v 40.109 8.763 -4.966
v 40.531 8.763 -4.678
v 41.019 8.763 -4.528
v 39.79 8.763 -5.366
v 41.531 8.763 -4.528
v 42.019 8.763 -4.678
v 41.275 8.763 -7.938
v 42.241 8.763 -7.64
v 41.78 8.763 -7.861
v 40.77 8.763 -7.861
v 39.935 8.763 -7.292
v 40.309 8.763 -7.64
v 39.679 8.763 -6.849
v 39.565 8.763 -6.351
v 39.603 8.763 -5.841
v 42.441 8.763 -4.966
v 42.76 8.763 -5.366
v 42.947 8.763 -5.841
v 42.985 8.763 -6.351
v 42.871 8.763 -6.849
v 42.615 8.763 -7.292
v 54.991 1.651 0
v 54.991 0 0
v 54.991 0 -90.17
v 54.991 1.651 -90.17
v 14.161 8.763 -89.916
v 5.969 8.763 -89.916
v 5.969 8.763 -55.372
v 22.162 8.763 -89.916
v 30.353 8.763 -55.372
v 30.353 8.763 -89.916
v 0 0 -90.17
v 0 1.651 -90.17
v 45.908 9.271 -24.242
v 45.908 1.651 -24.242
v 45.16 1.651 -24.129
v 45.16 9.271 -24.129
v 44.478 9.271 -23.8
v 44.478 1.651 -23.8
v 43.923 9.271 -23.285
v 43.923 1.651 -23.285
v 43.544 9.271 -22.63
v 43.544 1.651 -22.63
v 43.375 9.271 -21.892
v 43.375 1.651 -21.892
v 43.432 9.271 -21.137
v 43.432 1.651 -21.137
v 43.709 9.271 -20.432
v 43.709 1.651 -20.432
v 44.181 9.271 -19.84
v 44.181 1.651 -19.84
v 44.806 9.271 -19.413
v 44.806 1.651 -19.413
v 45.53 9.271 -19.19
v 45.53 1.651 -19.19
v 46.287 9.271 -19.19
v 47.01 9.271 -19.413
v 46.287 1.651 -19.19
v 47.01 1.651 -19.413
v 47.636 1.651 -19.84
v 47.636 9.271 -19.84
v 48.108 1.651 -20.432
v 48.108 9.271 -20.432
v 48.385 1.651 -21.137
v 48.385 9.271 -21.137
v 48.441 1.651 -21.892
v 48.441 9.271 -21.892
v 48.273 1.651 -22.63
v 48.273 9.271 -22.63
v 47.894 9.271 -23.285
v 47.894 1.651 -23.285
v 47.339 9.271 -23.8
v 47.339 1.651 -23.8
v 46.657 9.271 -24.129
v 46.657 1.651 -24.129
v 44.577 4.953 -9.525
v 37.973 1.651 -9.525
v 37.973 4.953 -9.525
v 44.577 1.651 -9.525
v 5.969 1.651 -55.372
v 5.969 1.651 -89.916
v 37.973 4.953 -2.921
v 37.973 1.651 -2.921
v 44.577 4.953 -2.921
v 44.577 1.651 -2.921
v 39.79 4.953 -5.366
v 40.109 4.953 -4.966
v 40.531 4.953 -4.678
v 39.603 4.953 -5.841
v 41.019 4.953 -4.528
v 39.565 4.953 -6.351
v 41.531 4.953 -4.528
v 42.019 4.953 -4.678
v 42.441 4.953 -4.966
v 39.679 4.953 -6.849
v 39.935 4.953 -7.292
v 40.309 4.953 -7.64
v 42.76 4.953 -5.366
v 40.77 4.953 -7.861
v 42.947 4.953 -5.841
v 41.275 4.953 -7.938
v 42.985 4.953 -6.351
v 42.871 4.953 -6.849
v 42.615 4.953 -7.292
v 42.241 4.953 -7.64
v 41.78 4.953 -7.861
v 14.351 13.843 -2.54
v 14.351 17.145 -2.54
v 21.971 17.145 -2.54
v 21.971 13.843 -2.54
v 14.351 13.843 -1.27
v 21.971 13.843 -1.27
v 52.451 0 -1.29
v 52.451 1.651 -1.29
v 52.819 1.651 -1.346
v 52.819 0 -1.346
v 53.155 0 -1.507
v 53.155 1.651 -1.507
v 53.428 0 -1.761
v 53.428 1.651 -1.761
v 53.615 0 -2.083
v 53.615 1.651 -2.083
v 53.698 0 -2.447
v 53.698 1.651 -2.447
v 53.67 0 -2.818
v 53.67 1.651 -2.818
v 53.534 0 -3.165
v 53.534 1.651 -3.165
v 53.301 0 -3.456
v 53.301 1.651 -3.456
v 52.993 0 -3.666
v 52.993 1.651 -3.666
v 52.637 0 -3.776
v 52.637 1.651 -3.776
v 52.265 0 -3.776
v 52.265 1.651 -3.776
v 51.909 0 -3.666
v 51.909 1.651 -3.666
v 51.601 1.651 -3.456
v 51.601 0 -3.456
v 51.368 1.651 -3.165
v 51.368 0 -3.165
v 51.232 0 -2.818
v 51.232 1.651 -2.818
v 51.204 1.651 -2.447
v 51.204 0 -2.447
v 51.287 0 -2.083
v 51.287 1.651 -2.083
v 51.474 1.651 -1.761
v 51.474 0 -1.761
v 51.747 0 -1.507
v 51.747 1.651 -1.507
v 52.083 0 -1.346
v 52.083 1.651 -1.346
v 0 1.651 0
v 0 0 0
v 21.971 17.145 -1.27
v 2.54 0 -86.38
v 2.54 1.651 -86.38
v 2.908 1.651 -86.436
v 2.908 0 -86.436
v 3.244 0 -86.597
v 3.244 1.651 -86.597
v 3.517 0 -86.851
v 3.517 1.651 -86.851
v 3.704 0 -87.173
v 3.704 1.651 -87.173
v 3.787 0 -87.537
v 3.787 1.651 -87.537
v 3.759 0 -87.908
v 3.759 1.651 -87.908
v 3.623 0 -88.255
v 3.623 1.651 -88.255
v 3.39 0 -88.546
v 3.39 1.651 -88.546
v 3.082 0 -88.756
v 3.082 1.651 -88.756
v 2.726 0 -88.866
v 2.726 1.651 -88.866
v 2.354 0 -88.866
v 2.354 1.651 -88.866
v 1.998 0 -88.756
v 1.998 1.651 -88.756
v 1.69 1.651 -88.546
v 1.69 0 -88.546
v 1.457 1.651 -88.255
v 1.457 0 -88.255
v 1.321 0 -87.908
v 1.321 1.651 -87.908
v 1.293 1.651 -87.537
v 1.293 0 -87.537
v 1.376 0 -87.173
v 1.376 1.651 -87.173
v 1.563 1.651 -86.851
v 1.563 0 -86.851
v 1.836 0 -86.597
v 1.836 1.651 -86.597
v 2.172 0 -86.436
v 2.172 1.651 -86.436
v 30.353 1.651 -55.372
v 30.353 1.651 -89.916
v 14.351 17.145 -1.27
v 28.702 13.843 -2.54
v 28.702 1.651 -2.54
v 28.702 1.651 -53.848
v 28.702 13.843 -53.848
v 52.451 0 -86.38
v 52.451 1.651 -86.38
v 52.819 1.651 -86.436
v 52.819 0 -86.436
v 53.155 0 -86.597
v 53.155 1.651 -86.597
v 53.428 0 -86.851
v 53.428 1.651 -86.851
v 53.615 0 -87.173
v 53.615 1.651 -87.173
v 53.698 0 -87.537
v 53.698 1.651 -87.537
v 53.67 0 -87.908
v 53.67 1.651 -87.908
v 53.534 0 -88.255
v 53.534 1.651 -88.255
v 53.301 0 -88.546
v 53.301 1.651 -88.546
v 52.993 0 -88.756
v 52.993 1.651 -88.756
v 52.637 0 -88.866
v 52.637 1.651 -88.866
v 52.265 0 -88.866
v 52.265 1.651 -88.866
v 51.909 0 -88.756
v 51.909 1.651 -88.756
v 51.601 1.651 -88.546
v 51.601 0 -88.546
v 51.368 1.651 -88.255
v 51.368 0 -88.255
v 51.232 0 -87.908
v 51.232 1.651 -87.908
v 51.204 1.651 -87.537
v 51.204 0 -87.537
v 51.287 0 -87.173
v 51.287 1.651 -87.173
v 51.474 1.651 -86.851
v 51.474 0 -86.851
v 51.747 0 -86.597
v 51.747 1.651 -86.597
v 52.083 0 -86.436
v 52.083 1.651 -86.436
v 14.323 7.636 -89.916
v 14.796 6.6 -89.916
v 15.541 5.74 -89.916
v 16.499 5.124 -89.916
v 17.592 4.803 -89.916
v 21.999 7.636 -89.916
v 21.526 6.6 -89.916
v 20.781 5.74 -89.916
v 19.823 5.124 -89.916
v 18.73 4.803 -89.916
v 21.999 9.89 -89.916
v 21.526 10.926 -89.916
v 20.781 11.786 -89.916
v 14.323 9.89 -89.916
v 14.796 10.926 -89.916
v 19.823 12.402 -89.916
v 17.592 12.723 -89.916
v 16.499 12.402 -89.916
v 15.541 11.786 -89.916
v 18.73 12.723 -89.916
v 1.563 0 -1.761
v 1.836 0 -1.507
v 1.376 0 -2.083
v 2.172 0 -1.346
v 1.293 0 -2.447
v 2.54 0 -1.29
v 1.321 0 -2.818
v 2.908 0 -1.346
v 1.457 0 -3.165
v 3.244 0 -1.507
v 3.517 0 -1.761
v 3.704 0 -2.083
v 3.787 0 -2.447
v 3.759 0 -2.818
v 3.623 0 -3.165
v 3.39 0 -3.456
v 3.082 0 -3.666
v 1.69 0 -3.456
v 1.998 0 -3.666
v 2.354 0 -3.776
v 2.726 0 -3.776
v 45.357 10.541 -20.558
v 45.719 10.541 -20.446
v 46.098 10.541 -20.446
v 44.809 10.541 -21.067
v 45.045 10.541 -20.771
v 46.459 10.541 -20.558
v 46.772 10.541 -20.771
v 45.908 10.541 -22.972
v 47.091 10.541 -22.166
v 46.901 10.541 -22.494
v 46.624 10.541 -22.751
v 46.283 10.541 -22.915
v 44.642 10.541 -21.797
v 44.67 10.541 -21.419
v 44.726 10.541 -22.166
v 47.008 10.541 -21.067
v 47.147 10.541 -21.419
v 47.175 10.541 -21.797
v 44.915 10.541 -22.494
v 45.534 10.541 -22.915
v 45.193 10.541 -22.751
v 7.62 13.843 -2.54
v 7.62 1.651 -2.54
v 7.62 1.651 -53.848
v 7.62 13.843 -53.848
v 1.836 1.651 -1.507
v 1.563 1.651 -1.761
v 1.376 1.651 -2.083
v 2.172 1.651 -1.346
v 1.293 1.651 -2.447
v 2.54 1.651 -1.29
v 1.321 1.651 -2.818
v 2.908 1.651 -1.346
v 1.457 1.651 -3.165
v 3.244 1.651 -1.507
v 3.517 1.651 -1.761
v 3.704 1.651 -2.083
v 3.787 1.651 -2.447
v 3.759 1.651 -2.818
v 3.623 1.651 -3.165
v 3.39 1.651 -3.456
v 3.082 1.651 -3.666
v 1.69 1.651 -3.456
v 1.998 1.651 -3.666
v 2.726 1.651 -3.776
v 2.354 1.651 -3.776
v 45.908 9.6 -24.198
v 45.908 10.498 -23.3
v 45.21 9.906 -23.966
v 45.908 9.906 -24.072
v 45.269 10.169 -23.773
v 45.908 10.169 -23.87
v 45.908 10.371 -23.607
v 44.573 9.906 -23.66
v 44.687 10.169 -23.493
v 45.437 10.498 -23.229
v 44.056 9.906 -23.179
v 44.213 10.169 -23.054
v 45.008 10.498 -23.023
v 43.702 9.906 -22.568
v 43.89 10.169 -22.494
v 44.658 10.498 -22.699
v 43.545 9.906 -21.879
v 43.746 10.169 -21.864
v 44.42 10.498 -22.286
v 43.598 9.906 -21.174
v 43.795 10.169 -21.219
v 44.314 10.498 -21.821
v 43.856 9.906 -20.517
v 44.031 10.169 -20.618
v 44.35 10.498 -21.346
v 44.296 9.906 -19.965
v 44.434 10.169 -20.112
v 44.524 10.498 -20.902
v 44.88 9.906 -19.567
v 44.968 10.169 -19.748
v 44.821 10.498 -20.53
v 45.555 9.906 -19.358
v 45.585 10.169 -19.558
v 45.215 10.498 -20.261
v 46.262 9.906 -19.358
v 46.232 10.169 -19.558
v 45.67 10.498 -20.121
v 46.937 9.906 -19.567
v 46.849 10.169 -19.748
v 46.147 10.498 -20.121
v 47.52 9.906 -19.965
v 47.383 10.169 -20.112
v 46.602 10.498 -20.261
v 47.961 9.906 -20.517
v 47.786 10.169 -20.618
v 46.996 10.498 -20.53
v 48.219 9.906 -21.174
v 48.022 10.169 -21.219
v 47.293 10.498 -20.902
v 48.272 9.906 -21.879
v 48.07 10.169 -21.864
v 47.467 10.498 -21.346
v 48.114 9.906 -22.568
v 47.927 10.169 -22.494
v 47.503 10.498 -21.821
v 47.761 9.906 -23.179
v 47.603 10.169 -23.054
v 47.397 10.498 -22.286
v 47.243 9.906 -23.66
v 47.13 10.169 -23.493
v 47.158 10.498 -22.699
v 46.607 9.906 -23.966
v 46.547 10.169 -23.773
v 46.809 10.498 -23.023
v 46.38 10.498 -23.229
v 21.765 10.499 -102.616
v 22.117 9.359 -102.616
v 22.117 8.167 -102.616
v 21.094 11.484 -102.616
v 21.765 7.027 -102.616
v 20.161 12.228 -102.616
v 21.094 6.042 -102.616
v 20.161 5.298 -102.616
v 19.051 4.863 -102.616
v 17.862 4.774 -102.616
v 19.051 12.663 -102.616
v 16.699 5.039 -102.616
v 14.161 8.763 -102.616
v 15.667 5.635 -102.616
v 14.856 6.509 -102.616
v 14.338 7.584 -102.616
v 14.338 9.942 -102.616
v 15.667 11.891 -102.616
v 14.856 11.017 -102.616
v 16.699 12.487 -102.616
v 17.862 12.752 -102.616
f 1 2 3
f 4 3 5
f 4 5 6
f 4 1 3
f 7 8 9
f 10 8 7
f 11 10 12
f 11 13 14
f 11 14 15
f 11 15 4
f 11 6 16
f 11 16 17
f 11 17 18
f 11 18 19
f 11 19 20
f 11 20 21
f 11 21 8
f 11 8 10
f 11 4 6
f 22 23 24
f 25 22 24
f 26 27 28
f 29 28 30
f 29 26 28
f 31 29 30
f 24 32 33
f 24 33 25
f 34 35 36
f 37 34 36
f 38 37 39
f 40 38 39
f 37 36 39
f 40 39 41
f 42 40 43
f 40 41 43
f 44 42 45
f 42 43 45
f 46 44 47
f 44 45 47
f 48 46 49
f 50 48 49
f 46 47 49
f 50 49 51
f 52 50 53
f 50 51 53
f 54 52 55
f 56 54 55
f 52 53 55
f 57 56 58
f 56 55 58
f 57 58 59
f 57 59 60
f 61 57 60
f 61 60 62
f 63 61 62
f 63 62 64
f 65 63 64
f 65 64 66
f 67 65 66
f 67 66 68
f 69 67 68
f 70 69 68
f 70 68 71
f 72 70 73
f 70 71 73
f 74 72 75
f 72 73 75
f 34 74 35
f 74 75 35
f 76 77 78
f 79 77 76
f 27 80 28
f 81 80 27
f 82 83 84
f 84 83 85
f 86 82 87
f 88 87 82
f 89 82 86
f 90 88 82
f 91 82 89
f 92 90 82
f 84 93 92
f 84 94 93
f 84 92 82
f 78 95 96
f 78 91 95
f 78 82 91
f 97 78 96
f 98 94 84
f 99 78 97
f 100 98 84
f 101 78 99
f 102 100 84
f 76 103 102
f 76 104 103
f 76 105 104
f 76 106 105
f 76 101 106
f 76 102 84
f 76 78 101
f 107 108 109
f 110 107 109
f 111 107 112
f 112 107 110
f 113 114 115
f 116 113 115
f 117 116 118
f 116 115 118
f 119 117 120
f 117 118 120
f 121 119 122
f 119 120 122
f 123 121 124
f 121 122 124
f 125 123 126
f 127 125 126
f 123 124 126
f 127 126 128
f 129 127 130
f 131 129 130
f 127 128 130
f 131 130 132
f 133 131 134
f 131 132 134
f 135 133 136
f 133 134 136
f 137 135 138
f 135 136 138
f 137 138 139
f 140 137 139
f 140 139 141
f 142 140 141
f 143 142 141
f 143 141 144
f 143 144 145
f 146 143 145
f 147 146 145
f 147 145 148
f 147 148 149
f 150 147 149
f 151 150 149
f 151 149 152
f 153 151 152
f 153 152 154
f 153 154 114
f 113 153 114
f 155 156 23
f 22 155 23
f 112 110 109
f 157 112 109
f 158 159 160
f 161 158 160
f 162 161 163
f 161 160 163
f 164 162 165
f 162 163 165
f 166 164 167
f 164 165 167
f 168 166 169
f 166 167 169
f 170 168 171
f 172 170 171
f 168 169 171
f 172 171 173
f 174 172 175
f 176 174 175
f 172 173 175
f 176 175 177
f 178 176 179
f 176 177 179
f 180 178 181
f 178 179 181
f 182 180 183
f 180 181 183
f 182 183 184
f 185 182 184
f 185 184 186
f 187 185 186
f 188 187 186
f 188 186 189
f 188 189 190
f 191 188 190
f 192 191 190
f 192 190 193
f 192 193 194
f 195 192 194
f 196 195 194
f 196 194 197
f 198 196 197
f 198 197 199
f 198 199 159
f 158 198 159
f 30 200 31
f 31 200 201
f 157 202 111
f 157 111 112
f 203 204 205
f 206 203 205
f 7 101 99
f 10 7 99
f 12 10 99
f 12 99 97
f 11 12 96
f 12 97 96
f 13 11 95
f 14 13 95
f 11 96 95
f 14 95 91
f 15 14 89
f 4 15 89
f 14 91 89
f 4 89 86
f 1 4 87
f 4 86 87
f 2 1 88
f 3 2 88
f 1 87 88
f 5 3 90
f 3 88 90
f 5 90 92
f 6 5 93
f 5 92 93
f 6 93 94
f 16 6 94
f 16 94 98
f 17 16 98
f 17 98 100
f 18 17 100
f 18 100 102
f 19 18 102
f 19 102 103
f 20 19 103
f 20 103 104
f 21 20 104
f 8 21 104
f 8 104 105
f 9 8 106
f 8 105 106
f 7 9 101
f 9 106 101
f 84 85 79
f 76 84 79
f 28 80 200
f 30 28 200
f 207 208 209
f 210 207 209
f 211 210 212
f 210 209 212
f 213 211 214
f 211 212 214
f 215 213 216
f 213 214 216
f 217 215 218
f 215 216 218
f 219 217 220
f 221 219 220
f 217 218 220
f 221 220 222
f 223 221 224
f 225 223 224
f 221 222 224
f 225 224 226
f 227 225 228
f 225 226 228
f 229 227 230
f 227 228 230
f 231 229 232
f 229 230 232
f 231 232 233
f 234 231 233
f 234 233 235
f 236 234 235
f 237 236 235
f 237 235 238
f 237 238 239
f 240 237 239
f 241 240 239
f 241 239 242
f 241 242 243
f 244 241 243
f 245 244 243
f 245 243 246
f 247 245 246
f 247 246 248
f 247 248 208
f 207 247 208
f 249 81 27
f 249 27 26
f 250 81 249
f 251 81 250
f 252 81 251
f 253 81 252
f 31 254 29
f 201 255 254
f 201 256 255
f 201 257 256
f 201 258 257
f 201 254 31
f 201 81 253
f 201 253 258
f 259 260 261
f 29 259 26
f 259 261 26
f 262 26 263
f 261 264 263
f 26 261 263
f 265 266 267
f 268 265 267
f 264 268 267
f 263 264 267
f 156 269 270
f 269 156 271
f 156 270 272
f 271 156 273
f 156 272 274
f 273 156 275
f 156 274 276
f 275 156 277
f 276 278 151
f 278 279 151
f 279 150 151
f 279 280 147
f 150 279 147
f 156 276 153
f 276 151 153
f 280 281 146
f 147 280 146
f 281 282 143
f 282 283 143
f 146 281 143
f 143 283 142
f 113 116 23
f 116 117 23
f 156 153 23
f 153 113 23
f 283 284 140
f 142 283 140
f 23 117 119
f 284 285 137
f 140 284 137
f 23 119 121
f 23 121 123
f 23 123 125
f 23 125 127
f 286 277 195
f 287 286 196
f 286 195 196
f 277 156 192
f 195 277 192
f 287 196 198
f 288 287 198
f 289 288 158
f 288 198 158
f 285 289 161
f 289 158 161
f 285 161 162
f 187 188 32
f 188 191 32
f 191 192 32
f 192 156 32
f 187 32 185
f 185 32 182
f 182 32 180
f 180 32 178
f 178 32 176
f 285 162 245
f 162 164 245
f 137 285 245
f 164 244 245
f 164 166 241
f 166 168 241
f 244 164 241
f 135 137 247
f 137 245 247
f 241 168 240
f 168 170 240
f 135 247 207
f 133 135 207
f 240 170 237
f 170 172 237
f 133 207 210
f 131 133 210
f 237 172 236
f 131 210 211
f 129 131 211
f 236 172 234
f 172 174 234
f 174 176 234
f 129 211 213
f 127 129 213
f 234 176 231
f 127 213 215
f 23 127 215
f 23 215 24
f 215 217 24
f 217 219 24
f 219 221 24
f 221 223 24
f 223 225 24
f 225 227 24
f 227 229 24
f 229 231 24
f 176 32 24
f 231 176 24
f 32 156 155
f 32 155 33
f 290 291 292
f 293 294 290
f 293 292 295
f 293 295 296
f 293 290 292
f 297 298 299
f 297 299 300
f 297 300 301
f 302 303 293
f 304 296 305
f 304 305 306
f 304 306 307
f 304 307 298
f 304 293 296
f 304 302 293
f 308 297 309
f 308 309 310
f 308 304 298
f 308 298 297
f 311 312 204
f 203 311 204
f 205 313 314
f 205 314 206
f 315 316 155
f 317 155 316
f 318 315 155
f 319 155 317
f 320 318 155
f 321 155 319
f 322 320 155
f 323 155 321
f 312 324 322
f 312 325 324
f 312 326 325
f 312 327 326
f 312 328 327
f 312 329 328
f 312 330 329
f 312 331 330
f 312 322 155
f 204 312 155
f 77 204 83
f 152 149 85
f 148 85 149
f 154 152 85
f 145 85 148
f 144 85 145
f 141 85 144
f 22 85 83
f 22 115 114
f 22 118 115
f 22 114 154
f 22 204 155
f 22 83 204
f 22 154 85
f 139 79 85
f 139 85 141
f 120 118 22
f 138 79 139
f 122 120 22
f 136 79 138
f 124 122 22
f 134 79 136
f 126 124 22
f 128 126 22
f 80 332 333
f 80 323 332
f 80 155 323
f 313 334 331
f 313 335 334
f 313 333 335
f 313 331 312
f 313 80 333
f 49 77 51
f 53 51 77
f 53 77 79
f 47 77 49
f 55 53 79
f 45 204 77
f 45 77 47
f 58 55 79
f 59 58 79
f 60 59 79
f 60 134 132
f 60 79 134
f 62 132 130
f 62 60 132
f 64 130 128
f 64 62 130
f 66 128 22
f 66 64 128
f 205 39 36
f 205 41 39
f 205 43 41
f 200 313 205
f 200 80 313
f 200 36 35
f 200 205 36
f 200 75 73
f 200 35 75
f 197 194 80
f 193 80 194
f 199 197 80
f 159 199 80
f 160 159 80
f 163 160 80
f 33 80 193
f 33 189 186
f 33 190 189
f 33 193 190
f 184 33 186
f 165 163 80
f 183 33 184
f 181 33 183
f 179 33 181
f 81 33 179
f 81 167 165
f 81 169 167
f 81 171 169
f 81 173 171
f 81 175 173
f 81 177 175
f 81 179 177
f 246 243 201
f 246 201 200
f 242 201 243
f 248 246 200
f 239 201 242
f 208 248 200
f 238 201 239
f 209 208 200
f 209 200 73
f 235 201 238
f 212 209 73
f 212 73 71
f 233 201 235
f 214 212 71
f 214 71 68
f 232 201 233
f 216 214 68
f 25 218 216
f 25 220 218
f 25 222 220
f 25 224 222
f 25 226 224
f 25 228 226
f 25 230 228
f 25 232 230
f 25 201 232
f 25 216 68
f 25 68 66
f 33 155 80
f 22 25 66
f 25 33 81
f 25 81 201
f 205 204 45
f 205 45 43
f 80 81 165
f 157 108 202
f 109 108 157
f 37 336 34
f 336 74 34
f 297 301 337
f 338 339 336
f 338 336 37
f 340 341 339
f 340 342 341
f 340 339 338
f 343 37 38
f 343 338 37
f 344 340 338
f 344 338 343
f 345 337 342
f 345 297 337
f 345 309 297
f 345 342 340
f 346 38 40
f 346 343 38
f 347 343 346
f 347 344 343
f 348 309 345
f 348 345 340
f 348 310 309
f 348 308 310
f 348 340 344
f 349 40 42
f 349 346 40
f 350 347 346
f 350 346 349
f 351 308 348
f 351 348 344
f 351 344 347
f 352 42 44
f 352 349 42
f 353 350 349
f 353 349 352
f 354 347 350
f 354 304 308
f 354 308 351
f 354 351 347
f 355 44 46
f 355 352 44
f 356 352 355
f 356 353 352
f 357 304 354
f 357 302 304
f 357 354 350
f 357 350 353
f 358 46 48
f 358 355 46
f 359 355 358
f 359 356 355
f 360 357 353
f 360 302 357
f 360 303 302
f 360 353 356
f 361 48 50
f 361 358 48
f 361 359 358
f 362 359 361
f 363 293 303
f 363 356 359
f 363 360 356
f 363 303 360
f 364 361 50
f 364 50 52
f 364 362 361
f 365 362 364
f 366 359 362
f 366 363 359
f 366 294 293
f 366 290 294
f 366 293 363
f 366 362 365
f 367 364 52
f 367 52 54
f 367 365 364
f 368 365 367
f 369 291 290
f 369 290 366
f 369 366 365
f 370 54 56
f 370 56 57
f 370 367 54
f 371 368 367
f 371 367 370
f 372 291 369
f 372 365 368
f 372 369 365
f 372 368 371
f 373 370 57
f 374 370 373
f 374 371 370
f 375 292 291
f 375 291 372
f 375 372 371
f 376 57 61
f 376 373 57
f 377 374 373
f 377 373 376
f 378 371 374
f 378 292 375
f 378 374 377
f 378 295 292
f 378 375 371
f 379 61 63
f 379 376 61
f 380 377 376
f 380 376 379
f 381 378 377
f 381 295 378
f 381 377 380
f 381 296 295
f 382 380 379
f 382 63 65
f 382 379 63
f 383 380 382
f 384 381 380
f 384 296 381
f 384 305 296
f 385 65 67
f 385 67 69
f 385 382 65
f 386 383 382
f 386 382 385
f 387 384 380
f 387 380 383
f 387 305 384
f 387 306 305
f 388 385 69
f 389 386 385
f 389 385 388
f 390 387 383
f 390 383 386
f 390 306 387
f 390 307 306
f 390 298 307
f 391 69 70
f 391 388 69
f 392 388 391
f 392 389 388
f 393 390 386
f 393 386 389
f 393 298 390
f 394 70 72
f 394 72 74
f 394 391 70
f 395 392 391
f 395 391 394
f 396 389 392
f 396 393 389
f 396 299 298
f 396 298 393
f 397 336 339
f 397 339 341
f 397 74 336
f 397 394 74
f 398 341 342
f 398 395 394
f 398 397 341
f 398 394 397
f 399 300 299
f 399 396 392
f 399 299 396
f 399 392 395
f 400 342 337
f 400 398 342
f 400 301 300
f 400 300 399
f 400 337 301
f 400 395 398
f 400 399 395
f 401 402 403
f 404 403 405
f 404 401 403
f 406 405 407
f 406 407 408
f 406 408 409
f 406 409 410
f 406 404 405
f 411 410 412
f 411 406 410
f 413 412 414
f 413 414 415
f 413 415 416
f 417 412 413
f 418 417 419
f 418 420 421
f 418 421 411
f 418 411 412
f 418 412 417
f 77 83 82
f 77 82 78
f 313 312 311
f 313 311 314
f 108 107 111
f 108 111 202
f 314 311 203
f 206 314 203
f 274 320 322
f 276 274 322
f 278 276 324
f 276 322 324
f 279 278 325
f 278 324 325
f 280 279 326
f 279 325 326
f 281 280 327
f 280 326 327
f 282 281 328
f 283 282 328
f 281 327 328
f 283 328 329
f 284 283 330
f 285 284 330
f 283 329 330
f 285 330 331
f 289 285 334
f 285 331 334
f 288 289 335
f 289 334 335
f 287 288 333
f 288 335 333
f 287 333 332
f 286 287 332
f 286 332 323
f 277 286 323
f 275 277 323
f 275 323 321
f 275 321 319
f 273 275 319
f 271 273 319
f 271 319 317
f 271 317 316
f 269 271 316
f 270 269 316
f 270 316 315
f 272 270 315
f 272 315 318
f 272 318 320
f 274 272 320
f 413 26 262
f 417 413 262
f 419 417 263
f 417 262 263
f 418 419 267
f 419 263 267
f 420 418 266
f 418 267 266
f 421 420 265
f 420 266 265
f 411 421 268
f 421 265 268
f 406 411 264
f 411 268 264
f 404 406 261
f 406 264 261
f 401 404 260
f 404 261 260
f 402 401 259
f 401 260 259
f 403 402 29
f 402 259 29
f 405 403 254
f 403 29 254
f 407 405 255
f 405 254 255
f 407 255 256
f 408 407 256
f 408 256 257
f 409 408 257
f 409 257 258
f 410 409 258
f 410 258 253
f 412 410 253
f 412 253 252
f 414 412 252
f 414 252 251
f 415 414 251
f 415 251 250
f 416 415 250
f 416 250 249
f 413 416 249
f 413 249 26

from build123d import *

# Parameters (mm, degrees)
SKETCH1_W           = 54.991
SKETCH1_H           = 90.17
BOARD_DEPTH         = 1.651
SKETCH2_W           = 21.082
SKETCH2_H           = 51.308
RPI_DEPTH           = 12.192
SKETCH2_3_W         = 6.604
SKETCH2_3_H         = 6.604
BUTTON_BASE_DEPTH   = 3.302
SKETCH2_4_W         = 24.384
SKETCH2_4_H         = 34.544
ZIGBEE_DEPTH        = 7.112
SKETCH3_R           = 1.7145
BUTTON_DEPTH        = 3.81
SKETCH4_R           = 2.54
LED_DEPTH           = 8.89
FILLET1_R           = 1.27
SKETCH5_W           = 7.62
SKETCH5_H           = 3.302
PI_PLUG_DEPTH       = 1.27
SKETCH6_R           = 4.0005
BOSS_EXTRUDE8_DEPTH = 12.7
SKETCH7_R           = 1.25
SCREW_HOLES_DEPTH   = 118.448361304


with BuildPart() as part:
    # Sketch1 → Board (new body)
    with BuildSketch(Plane(origin=(0, 0, 0), x_dir=(1, 0, 0), z_dir=(0, 1, 0))):
        with Locations((27.4955, 45.085)):
            Rectangle(SKETCH1_W, SKETCH1_H)
    extrude(amount=BOARD_DEPTH)

    # Sketch2 → RPI (add)
    with BuildSketch(Plane(origin=(0, 1.651, 0), x_dir=(1, 0, 0), z_dir=(0, 1, 0))):
        with Locations((18.161, 28.194)):
            Rectangle(SKETCH2_W, SKETCH2_H)
    extrude(amount=RPI_DEPTH)

    # Sketch2<3> → Button Base (add)
    with BuildSketch(Plane(origin=(0, 1.651, 0), x_dir=(1, 0, 0), z_dir=(0, 1, 0))):
        with Locations((41.275, 6.223)):
            Rectangle(SKETCH2_3_W, SKETCH2_3_H)
    extrude(amount=BUTTON_BASE_DEPTH)

    # Sketch2<4> → Zigbee (add)
    with BuildSketch(Plane(origin=(0, 1.651, 0), x_dir=(1, 0, 0), z_dir=(0, 1, 0))):
        with Locations((18.161, 72.644)):
            Rectangle(SKETCH2_4_W, SKETCH2_4_H)
    extrude(amount=ZIGBEE_DEPTH)

    # Sketch3 → Button (add)
    with BuildSketch(Plane(origin=(0, 4.953, 0), x_dir=(1, 0, 0), z_dir=(0, 1, 0))):
        with Locations((41.275, 6.223)):
            Circle(SKETCH3_R)
    extrude(amount=BUTTON_DEPTH)

    # Sketch4 → LED (add)
    with BuildSketch(Plane(origin=(0, 1.651, 0), x_dir=(1, 0, 0), z_dir=(0, 1, 0))):
        with Locations((45.908383197, 21.701767965)):
            Circle(SKETCH4_R)
    extrude(amount=LED_DEPTH)

    # Fillet1
    fillet1_edges = [part.edges().sort_by_distance(p)[0] for p in [
        (43.368383197, 10.541, -21.701767965),
    ]]
    fillet(fillet1_edges, radius=FILLET1_R)

    # Sketch6 → Boss-Extrude8 (add)
    with BuildSketch(Plane(origin=(0, 0, -89.916), x_dir=(-1, 0, 0), z_dir=(0, 0, -1))):
        with Locations((-18.161, 8.763)):
            Circle(SKETCH6_R)
    extrude(amount=BOSS_EXTRUDE8_DEPTH)

    # Sketch7 → Screw Holes (cut, through all)
    with BuildSketch(Plane(origin=(0, 1.651, 0), x_dir=(1, 0, 0), z_dir=(0, 1, 0))):
        with Locations((2.54, 87.63)):
            Circle(SKETCH7_R)
        with Locations((2.54, 2.54)):
            Circle(SKETCH7_R)
        with Locations((52.451, 2.54)):
            Circle(SKETCH7_R)
        with Locations((52.451, 87.63)):
            Circle(SKETCH7_R)
    extrude(amount=-SCREW_HOLES_DEPTH, mode=Mode.SUBTRACT)


with BuildPart() as body_2:
    # Sketch5 → PI Plug (new body)
    with BuildSketch(Plane.XY.offset(-2.54)):
        with Locations((18.161, 15.494)):
            Rectangle(SKETCH5_W, SKETCH5_H)
    extrude(amount=PI_PLUG_DEPTH)


solid = Compound([part.part, body_2.part])
